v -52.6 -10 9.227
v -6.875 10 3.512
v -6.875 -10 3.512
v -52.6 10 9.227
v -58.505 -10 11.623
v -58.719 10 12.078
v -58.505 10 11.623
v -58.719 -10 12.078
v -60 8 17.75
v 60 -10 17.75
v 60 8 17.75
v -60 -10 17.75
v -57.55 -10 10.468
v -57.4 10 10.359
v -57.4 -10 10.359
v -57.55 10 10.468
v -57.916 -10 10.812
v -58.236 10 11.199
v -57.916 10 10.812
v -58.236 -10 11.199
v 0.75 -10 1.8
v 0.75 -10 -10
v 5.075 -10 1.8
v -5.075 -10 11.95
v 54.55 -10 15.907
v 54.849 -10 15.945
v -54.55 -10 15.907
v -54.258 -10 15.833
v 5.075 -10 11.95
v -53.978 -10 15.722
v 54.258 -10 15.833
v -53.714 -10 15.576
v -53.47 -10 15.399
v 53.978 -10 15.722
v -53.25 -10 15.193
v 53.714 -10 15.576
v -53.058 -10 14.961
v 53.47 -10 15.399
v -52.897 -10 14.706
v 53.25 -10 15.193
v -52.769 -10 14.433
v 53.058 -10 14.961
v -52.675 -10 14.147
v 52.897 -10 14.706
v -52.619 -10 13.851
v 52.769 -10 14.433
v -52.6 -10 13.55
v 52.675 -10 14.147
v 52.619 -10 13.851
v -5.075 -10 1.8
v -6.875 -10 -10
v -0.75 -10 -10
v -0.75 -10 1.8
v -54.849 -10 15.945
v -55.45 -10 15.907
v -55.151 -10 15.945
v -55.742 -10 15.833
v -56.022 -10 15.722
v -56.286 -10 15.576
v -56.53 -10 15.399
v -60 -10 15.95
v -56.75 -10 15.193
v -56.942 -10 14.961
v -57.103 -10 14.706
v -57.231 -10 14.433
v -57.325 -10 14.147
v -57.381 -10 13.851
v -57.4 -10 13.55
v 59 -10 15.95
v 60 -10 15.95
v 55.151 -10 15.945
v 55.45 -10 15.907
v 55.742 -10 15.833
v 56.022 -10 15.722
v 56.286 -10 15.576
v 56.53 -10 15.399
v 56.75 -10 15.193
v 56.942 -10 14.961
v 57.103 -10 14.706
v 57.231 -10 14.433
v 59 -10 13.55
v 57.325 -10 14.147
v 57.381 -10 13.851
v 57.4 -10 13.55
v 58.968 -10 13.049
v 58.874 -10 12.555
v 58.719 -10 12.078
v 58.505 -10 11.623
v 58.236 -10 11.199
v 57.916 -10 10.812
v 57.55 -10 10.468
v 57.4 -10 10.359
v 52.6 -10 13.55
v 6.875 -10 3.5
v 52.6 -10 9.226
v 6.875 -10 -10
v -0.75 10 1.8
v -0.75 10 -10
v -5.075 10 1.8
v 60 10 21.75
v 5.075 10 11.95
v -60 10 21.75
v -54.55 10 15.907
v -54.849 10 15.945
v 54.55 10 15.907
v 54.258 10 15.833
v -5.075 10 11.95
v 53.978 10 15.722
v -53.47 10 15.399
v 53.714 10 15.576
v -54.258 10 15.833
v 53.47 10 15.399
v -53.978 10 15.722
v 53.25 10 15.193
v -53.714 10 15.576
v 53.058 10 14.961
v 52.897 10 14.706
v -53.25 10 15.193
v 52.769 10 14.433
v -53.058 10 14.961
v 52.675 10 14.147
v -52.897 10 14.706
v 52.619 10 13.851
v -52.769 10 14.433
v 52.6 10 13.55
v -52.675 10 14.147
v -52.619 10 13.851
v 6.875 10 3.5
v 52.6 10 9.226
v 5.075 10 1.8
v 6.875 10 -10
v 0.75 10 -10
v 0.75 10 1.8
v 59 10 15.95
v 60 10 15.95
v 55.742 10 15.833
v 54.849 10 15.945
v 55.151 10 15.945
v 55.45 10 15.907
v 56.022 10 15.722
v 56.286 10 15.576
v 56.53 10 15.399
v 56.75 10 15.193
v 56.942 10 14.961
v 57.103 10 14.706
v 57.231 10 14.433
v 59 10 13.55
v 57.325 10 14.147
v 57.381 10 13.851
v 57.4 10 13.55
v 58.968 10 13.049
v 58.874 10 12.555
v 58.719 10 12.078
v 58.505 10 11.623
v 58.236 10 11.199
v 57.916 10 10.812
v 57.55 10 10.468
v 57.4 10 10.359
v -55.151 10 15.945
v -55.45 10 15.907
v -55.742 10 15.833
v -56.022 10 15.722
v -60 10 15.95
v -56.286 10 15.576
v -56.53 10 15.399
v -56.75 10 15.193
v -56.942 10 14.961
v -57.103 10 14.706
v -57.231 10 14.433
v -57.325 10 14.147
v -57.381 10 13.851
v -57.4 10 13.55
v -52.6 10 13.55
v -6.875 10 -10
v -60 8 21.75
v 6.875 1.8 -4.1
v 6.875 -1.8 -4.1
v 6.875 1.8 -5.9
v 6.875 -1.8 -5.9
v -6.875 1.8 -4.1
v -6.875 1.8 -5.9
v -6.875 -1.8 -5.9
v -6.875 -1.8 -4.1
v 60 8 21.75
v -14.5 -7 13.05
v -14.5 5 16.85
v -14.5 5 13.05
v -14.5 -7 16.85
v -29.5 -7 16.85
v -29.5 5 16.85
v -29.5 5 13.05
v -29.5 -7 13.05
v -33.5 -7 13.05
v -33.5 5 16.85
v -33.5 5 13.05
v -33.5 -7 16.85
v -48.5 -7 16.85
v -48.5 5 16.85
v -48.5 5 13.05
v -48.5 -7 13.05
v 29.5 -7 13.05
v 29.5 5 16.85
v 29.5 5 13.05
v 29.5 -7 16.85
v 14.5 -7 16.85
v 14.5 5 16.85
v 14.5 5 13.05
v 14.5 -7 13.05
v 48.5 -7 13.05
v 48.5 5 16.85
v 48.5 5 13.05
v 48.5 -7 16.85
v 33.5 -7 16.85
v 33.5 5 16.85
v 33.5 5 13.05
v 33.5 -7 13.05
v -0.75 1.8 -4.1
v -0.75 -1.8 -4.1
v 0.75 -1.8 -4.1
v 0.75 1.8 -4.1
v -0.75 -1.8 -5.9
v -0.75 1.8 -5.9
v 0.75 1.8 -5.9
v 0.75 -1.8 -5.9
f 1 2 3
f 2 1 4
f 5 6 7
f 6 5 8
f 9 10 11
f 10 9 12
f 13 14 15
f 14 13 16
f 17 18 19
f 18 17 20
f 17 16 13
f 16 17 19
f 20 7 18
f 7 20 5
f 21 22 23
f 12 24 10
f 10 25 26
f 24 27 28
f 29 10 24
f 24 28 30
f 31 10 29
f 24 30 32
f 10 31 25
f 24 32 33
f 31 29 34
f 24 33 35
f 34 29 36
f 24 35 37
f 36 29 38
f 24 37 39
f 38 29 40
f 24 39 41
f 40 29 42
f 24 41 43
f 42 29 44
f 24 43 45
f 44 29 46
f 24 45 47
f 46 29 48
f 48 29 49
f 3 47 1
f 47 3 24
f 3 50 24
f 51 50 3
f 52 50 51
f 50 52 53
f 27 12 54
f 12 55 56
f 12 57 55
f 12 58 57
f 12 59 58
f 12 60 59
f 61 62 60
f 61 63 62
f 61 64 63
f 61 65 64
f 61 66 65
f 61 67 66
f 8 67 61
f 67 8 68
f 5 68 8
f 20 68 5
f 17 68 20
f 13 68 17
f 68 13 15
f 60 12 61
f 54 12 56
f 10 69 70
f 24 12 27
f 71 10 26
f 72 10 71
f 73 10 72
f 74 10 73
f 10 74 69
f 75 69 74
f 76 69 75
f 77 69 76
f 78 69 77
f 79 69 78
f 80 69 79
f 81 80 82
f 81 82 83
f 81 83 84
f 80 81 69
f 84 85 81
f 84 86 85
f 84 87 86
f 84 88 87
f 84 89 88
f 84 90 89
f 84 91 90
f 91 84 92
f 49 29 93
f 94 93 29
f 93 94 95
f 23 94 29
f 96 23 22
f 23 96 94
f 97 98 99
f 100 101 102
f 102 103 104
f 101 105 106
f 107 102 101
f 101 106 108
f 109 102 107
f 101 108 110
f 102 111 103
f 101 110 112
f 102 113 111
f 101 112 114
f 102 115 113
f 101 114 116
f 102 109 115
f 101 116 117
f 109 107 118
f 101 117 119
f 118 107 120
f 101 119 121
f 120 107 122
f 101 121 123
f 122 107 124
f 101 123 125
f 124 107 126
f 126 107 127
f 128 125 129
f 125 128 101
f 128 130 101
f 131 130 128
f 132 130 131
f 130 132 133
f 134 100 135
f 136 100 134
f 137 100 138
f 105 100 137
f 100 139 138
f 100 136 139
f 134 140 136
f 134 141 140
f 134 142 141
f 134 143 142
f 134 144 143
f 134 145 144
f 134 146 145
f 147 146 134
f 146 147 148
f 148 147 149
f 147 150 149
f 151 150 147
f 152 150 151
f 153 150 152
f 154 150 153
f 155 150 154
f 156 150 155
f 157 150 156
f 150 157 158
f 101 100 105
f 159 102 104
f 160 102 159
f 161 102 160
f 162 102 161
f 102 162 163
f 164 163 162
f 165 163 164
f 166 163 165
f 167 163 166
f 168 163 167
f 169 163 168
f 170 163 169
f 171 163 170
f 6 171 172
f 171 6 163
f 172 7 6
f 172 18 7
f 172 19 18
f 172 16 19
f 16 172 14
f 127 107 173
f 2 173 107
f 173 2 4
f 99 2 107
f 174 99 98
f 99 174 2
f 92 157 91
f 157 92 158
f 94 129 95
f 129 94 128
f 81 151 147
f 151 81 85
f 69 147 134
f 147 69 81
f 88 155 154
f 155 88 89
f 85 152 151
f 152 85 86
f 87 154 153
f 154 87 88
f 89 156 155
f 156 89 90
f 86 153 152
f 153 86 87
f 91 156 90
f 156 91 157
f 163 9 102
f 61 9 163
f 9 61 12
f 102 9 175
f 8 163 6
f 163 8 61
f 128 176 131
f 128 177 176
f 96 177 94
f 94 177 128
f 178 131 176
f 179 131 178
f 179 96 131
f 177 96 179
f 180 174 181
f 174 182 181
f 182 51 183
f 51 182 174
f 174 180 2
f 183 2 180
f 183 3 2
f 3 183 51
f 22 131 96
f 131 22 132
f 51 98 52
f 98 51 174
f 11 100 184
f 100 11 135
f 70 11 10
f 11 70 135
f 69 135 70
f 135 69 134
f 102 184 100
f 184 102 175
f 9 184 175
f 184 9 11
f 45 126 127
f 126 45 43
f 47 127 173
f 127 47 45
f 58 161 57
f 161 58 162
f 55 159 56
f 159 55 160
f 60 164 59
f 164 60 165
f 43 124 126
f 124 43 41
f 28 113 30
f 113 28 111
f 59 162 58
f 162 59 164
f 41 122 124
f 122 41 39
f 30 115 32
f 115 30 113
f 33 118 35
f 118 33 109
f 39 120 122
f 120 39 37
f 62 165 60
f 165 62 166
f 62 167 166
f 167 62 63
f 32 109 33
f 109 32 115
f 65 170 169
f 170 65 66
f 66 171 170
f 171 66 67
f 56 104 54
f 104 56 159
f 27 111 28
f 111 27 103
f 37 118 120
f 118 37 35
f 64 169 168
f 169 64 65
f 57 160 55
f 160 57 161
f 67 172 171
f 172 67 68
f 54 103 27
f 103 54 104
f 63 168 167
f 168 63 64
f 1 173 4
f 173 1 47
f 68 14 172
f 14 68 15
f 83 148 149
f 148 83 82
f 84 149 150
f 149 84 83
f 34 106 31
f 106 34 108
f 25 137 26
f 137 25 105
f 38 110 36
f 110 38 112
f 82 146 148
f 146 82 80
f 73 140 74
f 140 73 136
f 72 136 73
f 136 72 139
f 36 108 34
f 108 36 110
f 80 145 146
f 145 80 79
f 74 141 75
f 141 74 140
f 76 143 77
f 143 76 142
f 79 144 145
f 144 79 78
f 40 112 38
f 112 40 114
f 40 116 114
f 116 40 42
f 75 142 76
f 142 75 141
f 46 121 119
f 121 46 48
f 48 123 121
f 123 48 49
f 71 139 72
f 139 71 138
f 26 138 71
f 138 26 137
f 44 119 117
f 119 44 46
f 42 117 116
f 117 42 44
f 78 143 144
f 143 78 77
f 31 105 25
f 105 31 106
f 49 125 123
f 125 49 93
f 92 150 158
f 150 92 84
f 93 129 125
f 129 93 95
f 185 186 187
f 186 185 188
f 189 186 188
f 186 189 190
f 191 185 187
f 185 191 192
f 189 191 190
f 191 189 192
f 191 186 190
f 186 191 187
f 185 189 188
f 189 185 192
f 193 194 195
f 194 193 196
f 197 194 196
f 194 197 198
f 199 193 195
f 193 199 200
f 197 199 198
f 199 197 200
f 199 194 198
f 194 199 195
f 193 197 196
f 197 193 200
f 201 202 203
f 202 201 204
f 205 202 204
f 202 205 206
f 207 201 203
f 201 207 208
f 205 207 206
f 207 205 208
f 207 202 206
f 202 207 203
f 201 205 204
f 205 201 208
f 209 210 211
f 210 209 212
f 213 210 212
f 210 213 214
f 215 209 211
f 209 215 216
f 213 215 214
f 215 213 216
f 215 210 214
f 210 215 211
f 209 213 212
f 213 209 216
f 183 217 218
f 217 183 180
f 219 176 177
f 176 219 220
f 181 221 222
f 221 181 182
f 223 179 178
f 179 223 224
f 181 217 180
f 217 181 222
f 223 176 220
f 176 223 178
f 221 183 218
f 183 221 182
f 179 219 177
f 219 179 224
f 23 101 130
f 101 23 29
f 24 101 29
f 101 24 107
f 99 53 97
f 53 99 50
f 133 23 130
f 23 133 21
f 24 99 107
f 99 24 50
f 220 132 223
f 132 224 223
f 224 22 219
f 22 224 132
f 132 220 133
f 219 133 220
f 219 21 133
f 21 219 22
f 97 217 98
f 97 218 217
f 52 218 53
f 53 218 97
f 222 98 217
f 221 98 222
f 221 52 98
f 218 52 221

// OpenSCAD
// ===================================================================
// Project: OpenStickFPV
// Component: Ultralight Wing Saddle Mount (Full-Edge Gusset Reinforcement)
// - Diagonal structural gussets extend to the absolute outer edge of the
//   dowel holders (X = +/- 60mm), providing direct shear reinforcement
//   against rubber band tension
// - Gussets terminate on the collar above Z=0, preserving a clean lip
// - 10mm extended bottom clamp with lateral zip-tie slots (left & right)
// - Full-length bottom longitudinal compression slit for solid spar lock
// - Reversible print-twice design: Identical front and rear wing saddles
// - 120mm span with inverted bottom-open cradles for 4.0-4.5mm chopsticks/dowels
// - 4.0mm square wing retaining stop lip (leading/trailing edge stop)
// - Dual weight-saving windows per wing side across the bed
// - 100% support-free 3D printing
// ===================================================================

$fn = 50;

// --- Fuselage Spar Spec (10x10mm Square) ---
spar_width           = 10.15;  // 10x10mm spar (+0.15mm printer tolerance)
spar_height          = 10.15;  // 10x10mm spar height
sleeve_wall          = 1.8;    // Structural collar wall thickness
mount_length         = 20.0;   // Chord along fuselage (Y-axis)

// --- Extended Bottom Zip-Tie Clamping Spec ---
clamp_drop           = 10.0;   // Extended 10mm lower below the collar base
ziptie_slot_w        = 3.6;    // Slot length along fuselage (fits <=3mm ties)
ziptie_slot_h        = 1.8;    // Slot vertical clearance (Z-axis)
pinch_slit_w         = 1.5;    // Bottom longitudinal compression slit

// --- Gusset Termination & Outreach Spec ---
gusset_termination_z = 3.5;    // Gusset terminates above collar base (Z=0)

// --- Wing Saddle Platform Spec ---
saddle_span_x        = 120.0;  // Span across fuselage (outermost tip is +/-60mm)
saddle_bed_thick     = 1.8;    // Shelf thickness
saddle_riser_height  = 4.0;    // Lift above spar collar

// --- Wing Retaining Lip (Square Stop Fence) ---
lip_height           = 4.0;    // Height above wing bed to capture foam edge
lip_thickness_y      = 2.0;    // Thickness of vertical stop wall

// --- Inverted Dowel Cradle Spec (Bottom-Open) ---
dowel_dia            = 4.8;    // Fits ~4.0-4.5mm chopsticks / wooden dowels
cradle_wall          = 1.6;    // Structural wall surrounding cradle
dowel_x_offset       = 55.0;   // Centerline of dowel (+/- X)

// Derived Dimensions
collar_w       = spar_width + 2 * sleeve_wall;  // ~13.75mm
collar_h       = spar_height + 2 * sleeve_wall; // ~13.75mm

spar_bottom_z  = 0;
spar_top_z     = spar_bottom_z + collar_h;
saddle_top_z   = spar_top_z + saddle_riser_height;
dowel_center_z = saddle_top_z - saddle_bed_thick - dowel_dia / 2;

clamp_bottom_z = spar_bottom_z - clamp_drop;
ziptie_z       = clamp_bottom_z + clamp_drop / 2;

// Full outer boundary of the dowel holder boss
dowel_outer_x  = dowel_x_offset + dowel_dia / 2 + cradle_wall; // 60.0mm (extreme edge)

module wing_saddle_full_edge_gusset() {
    difference() {
        // -------------------------------------------------------------
        // 1. ADDITIVE SHAPES
        // -------------------------------------------------------------
        union() {
            // A. Central 10x10mm spar sleeve core
            translate([-collar_w/2, -mount_length/2, spar_bottom_z])
                cube([collar_w, mount_length, collar_h]);

            // B. Extended bottom clamp body (10mm lower, exact collar width)
            translate([-collar_w/2, -mount_length/2, clamp_bottom_z])
                cube([collar_w, mount_length, clamp_drop]);

            // C. Solid vertical riser post connecting collar to wing bed
            translate([-collar_w/2, -mount_length/2, collar_h - 0.1])
                cube([collar_w, mount_length, saddle_riser_height + 0.1]);

            // D. Unbroken horizontal wing shelf
            translate([-saddle_span_x/2, -mount_length/2, saddle_top_z - saddle_bed_thick])
                cube([saddle_span_x, mount_length, saddle_bed_thick]);

            // E. Clean 90-degree square wing retaining stop lip
            translate([-saddle_span_x/2, mount_length/2 - lip_thickness_y, saddle_top_z])
                cube([saddle_span_x, lip_thickness_y, lip_height]);

            // F. Full-Edge Diagonal Structural Truss Braces
            // Extends from collar side wall directly to the absolute outer tip of the dowel boss
            for (sx = [-1, 1]) {
                hull() {
                    // Inner root: lands on collar side wall above clamp area
                    translate([sx * (collar_w/2 - 0.1), -mount_length/2, gusset_termination_z])
                        cube([0.1, mount_length, collar_h + saddle_riser_height - gusset_termination_z]);

                    // Extreme outer termination: extends to the very outer edge of the dowel housing
                    translate([sx > 0 ? (dowel_outer_x - 0.2) : (-dowel_outer_x), -mount_length/2, saddle_top_z - saddle_bed_thick])
                        cube([0.2, mount_length, saddle_bed_thick]);

                    // Tie in to the underside of the outer dowel cradle cylinder
                    translate([sx * dowel_x_offset, 0, dowel_center_z])
                        rotate([90, 0, 0])
                        cylinder(d = dowel_dia + 2 * cradle_wall, h = mount_length, center = true);
                }
            }

            // G. Downward cradle bosses underneath the wing bed
            for (sx = [-1, 1]) {
                translate([sx * dowel_x_offset, 0, dowel_center_z])
                    rotate([90, 0, 0])
                    cylinder(d = dowel_dia + 2 * cradle_wall, h = mount_length, center = true);

                hull() {
                    translate([sx * dowel_x_offset, 0, dowel_center_z])
                        rotate([90, 0, 0])
                        cylinder(d = dowel_dia + 2 * cradle_wall, h = mount_length, center = true);
                    translate([
                        sx > 0 ? (dowel_x_offset - dowel_dia/2 - cradle_wall) : (-saddle_span_x/2),
                        -mount_length/2,
                        saddle_top_z - saddle_bed_thick
                    ])
                        cube([dowel_dia + 2 * cradle_wall, mount_length, saddle_bed_thick]);
                }
            }
        }

        // -------------------------------------------------------------
        // 2. 10x10mm SPAR CAVITY (Clean square carbon tunnel)
        // -------------------------------------------------------------
        translate([-spar_width/2, -mount_length/2 - 1, spar_bottom_z + sleeve_wall])
            cube([spar_width, mount_length + 2, spar_height]);

        // -------------------------------------------------------------
        // 3. BOTTOM-OPEN DOWEL CRADLES
        // -------------------------------------------------------------
        for (sx = [-1, 1]) {
            translate([sx * dowel_x_offset, 0, dowel_center_z])
                rotate([90, 0, 0])
                cylinder(d = dowel_dia, h = mount_length + 2, center = true);

            translate([sx * dowel_x_offset - dowel_dia/2, -mount_length/2 - 1, dowel_center_z - 10.0])
                cube([dowel_dia, mount_length + 2, 10.0]);
        }

        // -------------------------------------------------------------
        // 4. STANDARD DUAL LIGHTENING WINDOWS PER SIDE
        // -------------------------------------------------------------
        for (sx = [-1, 1]) {
            translate([sx * 22.0, -lip_thickness_y / 2, saddle_top_z - saddle_bed_thick - 1])
                cube([15.0, mount_length - lip_thickness_y - 6.0, saddle_bed_thick + 2], center = true);

            translate([sx * 41.0, -lip_thickness_y / 2, saddle_top_z - saddle_bed_thick - 1])
                cube([15.0, mount_length - lip_thickness_y - 6.0, saddle_bed_thick + 2], center = true);
        }

        // -------------------------------------------------------------
        // 5. EXTENDED LATERAL ZIP-TIE SLOTS (Right & Left)
        // -------------------------------------------------------------
        for (sx = [-1, 1]) {
            translate([sx * collar_w/4, 0, ziptie_z])
                cube([collar_w/2 + 2, ziptie_slot_w, ziptie_slot_h], center = true);
        }

        // -------------------------------------------------------------
        // 6. BOTTOM LONGITUDINAL COMPRESSION SLIT
        // -------------------------------------------------------------
        translate([-pinch_slit_w/2, -mount_length/2 - 1, clamp_bottom_z - 1])
            cube([pinch_slit_w, mount_length + 2, clamp_drop + sleeve_wall + 1.2]);
    }
}

wing_saddle_full_edge_gusset();
